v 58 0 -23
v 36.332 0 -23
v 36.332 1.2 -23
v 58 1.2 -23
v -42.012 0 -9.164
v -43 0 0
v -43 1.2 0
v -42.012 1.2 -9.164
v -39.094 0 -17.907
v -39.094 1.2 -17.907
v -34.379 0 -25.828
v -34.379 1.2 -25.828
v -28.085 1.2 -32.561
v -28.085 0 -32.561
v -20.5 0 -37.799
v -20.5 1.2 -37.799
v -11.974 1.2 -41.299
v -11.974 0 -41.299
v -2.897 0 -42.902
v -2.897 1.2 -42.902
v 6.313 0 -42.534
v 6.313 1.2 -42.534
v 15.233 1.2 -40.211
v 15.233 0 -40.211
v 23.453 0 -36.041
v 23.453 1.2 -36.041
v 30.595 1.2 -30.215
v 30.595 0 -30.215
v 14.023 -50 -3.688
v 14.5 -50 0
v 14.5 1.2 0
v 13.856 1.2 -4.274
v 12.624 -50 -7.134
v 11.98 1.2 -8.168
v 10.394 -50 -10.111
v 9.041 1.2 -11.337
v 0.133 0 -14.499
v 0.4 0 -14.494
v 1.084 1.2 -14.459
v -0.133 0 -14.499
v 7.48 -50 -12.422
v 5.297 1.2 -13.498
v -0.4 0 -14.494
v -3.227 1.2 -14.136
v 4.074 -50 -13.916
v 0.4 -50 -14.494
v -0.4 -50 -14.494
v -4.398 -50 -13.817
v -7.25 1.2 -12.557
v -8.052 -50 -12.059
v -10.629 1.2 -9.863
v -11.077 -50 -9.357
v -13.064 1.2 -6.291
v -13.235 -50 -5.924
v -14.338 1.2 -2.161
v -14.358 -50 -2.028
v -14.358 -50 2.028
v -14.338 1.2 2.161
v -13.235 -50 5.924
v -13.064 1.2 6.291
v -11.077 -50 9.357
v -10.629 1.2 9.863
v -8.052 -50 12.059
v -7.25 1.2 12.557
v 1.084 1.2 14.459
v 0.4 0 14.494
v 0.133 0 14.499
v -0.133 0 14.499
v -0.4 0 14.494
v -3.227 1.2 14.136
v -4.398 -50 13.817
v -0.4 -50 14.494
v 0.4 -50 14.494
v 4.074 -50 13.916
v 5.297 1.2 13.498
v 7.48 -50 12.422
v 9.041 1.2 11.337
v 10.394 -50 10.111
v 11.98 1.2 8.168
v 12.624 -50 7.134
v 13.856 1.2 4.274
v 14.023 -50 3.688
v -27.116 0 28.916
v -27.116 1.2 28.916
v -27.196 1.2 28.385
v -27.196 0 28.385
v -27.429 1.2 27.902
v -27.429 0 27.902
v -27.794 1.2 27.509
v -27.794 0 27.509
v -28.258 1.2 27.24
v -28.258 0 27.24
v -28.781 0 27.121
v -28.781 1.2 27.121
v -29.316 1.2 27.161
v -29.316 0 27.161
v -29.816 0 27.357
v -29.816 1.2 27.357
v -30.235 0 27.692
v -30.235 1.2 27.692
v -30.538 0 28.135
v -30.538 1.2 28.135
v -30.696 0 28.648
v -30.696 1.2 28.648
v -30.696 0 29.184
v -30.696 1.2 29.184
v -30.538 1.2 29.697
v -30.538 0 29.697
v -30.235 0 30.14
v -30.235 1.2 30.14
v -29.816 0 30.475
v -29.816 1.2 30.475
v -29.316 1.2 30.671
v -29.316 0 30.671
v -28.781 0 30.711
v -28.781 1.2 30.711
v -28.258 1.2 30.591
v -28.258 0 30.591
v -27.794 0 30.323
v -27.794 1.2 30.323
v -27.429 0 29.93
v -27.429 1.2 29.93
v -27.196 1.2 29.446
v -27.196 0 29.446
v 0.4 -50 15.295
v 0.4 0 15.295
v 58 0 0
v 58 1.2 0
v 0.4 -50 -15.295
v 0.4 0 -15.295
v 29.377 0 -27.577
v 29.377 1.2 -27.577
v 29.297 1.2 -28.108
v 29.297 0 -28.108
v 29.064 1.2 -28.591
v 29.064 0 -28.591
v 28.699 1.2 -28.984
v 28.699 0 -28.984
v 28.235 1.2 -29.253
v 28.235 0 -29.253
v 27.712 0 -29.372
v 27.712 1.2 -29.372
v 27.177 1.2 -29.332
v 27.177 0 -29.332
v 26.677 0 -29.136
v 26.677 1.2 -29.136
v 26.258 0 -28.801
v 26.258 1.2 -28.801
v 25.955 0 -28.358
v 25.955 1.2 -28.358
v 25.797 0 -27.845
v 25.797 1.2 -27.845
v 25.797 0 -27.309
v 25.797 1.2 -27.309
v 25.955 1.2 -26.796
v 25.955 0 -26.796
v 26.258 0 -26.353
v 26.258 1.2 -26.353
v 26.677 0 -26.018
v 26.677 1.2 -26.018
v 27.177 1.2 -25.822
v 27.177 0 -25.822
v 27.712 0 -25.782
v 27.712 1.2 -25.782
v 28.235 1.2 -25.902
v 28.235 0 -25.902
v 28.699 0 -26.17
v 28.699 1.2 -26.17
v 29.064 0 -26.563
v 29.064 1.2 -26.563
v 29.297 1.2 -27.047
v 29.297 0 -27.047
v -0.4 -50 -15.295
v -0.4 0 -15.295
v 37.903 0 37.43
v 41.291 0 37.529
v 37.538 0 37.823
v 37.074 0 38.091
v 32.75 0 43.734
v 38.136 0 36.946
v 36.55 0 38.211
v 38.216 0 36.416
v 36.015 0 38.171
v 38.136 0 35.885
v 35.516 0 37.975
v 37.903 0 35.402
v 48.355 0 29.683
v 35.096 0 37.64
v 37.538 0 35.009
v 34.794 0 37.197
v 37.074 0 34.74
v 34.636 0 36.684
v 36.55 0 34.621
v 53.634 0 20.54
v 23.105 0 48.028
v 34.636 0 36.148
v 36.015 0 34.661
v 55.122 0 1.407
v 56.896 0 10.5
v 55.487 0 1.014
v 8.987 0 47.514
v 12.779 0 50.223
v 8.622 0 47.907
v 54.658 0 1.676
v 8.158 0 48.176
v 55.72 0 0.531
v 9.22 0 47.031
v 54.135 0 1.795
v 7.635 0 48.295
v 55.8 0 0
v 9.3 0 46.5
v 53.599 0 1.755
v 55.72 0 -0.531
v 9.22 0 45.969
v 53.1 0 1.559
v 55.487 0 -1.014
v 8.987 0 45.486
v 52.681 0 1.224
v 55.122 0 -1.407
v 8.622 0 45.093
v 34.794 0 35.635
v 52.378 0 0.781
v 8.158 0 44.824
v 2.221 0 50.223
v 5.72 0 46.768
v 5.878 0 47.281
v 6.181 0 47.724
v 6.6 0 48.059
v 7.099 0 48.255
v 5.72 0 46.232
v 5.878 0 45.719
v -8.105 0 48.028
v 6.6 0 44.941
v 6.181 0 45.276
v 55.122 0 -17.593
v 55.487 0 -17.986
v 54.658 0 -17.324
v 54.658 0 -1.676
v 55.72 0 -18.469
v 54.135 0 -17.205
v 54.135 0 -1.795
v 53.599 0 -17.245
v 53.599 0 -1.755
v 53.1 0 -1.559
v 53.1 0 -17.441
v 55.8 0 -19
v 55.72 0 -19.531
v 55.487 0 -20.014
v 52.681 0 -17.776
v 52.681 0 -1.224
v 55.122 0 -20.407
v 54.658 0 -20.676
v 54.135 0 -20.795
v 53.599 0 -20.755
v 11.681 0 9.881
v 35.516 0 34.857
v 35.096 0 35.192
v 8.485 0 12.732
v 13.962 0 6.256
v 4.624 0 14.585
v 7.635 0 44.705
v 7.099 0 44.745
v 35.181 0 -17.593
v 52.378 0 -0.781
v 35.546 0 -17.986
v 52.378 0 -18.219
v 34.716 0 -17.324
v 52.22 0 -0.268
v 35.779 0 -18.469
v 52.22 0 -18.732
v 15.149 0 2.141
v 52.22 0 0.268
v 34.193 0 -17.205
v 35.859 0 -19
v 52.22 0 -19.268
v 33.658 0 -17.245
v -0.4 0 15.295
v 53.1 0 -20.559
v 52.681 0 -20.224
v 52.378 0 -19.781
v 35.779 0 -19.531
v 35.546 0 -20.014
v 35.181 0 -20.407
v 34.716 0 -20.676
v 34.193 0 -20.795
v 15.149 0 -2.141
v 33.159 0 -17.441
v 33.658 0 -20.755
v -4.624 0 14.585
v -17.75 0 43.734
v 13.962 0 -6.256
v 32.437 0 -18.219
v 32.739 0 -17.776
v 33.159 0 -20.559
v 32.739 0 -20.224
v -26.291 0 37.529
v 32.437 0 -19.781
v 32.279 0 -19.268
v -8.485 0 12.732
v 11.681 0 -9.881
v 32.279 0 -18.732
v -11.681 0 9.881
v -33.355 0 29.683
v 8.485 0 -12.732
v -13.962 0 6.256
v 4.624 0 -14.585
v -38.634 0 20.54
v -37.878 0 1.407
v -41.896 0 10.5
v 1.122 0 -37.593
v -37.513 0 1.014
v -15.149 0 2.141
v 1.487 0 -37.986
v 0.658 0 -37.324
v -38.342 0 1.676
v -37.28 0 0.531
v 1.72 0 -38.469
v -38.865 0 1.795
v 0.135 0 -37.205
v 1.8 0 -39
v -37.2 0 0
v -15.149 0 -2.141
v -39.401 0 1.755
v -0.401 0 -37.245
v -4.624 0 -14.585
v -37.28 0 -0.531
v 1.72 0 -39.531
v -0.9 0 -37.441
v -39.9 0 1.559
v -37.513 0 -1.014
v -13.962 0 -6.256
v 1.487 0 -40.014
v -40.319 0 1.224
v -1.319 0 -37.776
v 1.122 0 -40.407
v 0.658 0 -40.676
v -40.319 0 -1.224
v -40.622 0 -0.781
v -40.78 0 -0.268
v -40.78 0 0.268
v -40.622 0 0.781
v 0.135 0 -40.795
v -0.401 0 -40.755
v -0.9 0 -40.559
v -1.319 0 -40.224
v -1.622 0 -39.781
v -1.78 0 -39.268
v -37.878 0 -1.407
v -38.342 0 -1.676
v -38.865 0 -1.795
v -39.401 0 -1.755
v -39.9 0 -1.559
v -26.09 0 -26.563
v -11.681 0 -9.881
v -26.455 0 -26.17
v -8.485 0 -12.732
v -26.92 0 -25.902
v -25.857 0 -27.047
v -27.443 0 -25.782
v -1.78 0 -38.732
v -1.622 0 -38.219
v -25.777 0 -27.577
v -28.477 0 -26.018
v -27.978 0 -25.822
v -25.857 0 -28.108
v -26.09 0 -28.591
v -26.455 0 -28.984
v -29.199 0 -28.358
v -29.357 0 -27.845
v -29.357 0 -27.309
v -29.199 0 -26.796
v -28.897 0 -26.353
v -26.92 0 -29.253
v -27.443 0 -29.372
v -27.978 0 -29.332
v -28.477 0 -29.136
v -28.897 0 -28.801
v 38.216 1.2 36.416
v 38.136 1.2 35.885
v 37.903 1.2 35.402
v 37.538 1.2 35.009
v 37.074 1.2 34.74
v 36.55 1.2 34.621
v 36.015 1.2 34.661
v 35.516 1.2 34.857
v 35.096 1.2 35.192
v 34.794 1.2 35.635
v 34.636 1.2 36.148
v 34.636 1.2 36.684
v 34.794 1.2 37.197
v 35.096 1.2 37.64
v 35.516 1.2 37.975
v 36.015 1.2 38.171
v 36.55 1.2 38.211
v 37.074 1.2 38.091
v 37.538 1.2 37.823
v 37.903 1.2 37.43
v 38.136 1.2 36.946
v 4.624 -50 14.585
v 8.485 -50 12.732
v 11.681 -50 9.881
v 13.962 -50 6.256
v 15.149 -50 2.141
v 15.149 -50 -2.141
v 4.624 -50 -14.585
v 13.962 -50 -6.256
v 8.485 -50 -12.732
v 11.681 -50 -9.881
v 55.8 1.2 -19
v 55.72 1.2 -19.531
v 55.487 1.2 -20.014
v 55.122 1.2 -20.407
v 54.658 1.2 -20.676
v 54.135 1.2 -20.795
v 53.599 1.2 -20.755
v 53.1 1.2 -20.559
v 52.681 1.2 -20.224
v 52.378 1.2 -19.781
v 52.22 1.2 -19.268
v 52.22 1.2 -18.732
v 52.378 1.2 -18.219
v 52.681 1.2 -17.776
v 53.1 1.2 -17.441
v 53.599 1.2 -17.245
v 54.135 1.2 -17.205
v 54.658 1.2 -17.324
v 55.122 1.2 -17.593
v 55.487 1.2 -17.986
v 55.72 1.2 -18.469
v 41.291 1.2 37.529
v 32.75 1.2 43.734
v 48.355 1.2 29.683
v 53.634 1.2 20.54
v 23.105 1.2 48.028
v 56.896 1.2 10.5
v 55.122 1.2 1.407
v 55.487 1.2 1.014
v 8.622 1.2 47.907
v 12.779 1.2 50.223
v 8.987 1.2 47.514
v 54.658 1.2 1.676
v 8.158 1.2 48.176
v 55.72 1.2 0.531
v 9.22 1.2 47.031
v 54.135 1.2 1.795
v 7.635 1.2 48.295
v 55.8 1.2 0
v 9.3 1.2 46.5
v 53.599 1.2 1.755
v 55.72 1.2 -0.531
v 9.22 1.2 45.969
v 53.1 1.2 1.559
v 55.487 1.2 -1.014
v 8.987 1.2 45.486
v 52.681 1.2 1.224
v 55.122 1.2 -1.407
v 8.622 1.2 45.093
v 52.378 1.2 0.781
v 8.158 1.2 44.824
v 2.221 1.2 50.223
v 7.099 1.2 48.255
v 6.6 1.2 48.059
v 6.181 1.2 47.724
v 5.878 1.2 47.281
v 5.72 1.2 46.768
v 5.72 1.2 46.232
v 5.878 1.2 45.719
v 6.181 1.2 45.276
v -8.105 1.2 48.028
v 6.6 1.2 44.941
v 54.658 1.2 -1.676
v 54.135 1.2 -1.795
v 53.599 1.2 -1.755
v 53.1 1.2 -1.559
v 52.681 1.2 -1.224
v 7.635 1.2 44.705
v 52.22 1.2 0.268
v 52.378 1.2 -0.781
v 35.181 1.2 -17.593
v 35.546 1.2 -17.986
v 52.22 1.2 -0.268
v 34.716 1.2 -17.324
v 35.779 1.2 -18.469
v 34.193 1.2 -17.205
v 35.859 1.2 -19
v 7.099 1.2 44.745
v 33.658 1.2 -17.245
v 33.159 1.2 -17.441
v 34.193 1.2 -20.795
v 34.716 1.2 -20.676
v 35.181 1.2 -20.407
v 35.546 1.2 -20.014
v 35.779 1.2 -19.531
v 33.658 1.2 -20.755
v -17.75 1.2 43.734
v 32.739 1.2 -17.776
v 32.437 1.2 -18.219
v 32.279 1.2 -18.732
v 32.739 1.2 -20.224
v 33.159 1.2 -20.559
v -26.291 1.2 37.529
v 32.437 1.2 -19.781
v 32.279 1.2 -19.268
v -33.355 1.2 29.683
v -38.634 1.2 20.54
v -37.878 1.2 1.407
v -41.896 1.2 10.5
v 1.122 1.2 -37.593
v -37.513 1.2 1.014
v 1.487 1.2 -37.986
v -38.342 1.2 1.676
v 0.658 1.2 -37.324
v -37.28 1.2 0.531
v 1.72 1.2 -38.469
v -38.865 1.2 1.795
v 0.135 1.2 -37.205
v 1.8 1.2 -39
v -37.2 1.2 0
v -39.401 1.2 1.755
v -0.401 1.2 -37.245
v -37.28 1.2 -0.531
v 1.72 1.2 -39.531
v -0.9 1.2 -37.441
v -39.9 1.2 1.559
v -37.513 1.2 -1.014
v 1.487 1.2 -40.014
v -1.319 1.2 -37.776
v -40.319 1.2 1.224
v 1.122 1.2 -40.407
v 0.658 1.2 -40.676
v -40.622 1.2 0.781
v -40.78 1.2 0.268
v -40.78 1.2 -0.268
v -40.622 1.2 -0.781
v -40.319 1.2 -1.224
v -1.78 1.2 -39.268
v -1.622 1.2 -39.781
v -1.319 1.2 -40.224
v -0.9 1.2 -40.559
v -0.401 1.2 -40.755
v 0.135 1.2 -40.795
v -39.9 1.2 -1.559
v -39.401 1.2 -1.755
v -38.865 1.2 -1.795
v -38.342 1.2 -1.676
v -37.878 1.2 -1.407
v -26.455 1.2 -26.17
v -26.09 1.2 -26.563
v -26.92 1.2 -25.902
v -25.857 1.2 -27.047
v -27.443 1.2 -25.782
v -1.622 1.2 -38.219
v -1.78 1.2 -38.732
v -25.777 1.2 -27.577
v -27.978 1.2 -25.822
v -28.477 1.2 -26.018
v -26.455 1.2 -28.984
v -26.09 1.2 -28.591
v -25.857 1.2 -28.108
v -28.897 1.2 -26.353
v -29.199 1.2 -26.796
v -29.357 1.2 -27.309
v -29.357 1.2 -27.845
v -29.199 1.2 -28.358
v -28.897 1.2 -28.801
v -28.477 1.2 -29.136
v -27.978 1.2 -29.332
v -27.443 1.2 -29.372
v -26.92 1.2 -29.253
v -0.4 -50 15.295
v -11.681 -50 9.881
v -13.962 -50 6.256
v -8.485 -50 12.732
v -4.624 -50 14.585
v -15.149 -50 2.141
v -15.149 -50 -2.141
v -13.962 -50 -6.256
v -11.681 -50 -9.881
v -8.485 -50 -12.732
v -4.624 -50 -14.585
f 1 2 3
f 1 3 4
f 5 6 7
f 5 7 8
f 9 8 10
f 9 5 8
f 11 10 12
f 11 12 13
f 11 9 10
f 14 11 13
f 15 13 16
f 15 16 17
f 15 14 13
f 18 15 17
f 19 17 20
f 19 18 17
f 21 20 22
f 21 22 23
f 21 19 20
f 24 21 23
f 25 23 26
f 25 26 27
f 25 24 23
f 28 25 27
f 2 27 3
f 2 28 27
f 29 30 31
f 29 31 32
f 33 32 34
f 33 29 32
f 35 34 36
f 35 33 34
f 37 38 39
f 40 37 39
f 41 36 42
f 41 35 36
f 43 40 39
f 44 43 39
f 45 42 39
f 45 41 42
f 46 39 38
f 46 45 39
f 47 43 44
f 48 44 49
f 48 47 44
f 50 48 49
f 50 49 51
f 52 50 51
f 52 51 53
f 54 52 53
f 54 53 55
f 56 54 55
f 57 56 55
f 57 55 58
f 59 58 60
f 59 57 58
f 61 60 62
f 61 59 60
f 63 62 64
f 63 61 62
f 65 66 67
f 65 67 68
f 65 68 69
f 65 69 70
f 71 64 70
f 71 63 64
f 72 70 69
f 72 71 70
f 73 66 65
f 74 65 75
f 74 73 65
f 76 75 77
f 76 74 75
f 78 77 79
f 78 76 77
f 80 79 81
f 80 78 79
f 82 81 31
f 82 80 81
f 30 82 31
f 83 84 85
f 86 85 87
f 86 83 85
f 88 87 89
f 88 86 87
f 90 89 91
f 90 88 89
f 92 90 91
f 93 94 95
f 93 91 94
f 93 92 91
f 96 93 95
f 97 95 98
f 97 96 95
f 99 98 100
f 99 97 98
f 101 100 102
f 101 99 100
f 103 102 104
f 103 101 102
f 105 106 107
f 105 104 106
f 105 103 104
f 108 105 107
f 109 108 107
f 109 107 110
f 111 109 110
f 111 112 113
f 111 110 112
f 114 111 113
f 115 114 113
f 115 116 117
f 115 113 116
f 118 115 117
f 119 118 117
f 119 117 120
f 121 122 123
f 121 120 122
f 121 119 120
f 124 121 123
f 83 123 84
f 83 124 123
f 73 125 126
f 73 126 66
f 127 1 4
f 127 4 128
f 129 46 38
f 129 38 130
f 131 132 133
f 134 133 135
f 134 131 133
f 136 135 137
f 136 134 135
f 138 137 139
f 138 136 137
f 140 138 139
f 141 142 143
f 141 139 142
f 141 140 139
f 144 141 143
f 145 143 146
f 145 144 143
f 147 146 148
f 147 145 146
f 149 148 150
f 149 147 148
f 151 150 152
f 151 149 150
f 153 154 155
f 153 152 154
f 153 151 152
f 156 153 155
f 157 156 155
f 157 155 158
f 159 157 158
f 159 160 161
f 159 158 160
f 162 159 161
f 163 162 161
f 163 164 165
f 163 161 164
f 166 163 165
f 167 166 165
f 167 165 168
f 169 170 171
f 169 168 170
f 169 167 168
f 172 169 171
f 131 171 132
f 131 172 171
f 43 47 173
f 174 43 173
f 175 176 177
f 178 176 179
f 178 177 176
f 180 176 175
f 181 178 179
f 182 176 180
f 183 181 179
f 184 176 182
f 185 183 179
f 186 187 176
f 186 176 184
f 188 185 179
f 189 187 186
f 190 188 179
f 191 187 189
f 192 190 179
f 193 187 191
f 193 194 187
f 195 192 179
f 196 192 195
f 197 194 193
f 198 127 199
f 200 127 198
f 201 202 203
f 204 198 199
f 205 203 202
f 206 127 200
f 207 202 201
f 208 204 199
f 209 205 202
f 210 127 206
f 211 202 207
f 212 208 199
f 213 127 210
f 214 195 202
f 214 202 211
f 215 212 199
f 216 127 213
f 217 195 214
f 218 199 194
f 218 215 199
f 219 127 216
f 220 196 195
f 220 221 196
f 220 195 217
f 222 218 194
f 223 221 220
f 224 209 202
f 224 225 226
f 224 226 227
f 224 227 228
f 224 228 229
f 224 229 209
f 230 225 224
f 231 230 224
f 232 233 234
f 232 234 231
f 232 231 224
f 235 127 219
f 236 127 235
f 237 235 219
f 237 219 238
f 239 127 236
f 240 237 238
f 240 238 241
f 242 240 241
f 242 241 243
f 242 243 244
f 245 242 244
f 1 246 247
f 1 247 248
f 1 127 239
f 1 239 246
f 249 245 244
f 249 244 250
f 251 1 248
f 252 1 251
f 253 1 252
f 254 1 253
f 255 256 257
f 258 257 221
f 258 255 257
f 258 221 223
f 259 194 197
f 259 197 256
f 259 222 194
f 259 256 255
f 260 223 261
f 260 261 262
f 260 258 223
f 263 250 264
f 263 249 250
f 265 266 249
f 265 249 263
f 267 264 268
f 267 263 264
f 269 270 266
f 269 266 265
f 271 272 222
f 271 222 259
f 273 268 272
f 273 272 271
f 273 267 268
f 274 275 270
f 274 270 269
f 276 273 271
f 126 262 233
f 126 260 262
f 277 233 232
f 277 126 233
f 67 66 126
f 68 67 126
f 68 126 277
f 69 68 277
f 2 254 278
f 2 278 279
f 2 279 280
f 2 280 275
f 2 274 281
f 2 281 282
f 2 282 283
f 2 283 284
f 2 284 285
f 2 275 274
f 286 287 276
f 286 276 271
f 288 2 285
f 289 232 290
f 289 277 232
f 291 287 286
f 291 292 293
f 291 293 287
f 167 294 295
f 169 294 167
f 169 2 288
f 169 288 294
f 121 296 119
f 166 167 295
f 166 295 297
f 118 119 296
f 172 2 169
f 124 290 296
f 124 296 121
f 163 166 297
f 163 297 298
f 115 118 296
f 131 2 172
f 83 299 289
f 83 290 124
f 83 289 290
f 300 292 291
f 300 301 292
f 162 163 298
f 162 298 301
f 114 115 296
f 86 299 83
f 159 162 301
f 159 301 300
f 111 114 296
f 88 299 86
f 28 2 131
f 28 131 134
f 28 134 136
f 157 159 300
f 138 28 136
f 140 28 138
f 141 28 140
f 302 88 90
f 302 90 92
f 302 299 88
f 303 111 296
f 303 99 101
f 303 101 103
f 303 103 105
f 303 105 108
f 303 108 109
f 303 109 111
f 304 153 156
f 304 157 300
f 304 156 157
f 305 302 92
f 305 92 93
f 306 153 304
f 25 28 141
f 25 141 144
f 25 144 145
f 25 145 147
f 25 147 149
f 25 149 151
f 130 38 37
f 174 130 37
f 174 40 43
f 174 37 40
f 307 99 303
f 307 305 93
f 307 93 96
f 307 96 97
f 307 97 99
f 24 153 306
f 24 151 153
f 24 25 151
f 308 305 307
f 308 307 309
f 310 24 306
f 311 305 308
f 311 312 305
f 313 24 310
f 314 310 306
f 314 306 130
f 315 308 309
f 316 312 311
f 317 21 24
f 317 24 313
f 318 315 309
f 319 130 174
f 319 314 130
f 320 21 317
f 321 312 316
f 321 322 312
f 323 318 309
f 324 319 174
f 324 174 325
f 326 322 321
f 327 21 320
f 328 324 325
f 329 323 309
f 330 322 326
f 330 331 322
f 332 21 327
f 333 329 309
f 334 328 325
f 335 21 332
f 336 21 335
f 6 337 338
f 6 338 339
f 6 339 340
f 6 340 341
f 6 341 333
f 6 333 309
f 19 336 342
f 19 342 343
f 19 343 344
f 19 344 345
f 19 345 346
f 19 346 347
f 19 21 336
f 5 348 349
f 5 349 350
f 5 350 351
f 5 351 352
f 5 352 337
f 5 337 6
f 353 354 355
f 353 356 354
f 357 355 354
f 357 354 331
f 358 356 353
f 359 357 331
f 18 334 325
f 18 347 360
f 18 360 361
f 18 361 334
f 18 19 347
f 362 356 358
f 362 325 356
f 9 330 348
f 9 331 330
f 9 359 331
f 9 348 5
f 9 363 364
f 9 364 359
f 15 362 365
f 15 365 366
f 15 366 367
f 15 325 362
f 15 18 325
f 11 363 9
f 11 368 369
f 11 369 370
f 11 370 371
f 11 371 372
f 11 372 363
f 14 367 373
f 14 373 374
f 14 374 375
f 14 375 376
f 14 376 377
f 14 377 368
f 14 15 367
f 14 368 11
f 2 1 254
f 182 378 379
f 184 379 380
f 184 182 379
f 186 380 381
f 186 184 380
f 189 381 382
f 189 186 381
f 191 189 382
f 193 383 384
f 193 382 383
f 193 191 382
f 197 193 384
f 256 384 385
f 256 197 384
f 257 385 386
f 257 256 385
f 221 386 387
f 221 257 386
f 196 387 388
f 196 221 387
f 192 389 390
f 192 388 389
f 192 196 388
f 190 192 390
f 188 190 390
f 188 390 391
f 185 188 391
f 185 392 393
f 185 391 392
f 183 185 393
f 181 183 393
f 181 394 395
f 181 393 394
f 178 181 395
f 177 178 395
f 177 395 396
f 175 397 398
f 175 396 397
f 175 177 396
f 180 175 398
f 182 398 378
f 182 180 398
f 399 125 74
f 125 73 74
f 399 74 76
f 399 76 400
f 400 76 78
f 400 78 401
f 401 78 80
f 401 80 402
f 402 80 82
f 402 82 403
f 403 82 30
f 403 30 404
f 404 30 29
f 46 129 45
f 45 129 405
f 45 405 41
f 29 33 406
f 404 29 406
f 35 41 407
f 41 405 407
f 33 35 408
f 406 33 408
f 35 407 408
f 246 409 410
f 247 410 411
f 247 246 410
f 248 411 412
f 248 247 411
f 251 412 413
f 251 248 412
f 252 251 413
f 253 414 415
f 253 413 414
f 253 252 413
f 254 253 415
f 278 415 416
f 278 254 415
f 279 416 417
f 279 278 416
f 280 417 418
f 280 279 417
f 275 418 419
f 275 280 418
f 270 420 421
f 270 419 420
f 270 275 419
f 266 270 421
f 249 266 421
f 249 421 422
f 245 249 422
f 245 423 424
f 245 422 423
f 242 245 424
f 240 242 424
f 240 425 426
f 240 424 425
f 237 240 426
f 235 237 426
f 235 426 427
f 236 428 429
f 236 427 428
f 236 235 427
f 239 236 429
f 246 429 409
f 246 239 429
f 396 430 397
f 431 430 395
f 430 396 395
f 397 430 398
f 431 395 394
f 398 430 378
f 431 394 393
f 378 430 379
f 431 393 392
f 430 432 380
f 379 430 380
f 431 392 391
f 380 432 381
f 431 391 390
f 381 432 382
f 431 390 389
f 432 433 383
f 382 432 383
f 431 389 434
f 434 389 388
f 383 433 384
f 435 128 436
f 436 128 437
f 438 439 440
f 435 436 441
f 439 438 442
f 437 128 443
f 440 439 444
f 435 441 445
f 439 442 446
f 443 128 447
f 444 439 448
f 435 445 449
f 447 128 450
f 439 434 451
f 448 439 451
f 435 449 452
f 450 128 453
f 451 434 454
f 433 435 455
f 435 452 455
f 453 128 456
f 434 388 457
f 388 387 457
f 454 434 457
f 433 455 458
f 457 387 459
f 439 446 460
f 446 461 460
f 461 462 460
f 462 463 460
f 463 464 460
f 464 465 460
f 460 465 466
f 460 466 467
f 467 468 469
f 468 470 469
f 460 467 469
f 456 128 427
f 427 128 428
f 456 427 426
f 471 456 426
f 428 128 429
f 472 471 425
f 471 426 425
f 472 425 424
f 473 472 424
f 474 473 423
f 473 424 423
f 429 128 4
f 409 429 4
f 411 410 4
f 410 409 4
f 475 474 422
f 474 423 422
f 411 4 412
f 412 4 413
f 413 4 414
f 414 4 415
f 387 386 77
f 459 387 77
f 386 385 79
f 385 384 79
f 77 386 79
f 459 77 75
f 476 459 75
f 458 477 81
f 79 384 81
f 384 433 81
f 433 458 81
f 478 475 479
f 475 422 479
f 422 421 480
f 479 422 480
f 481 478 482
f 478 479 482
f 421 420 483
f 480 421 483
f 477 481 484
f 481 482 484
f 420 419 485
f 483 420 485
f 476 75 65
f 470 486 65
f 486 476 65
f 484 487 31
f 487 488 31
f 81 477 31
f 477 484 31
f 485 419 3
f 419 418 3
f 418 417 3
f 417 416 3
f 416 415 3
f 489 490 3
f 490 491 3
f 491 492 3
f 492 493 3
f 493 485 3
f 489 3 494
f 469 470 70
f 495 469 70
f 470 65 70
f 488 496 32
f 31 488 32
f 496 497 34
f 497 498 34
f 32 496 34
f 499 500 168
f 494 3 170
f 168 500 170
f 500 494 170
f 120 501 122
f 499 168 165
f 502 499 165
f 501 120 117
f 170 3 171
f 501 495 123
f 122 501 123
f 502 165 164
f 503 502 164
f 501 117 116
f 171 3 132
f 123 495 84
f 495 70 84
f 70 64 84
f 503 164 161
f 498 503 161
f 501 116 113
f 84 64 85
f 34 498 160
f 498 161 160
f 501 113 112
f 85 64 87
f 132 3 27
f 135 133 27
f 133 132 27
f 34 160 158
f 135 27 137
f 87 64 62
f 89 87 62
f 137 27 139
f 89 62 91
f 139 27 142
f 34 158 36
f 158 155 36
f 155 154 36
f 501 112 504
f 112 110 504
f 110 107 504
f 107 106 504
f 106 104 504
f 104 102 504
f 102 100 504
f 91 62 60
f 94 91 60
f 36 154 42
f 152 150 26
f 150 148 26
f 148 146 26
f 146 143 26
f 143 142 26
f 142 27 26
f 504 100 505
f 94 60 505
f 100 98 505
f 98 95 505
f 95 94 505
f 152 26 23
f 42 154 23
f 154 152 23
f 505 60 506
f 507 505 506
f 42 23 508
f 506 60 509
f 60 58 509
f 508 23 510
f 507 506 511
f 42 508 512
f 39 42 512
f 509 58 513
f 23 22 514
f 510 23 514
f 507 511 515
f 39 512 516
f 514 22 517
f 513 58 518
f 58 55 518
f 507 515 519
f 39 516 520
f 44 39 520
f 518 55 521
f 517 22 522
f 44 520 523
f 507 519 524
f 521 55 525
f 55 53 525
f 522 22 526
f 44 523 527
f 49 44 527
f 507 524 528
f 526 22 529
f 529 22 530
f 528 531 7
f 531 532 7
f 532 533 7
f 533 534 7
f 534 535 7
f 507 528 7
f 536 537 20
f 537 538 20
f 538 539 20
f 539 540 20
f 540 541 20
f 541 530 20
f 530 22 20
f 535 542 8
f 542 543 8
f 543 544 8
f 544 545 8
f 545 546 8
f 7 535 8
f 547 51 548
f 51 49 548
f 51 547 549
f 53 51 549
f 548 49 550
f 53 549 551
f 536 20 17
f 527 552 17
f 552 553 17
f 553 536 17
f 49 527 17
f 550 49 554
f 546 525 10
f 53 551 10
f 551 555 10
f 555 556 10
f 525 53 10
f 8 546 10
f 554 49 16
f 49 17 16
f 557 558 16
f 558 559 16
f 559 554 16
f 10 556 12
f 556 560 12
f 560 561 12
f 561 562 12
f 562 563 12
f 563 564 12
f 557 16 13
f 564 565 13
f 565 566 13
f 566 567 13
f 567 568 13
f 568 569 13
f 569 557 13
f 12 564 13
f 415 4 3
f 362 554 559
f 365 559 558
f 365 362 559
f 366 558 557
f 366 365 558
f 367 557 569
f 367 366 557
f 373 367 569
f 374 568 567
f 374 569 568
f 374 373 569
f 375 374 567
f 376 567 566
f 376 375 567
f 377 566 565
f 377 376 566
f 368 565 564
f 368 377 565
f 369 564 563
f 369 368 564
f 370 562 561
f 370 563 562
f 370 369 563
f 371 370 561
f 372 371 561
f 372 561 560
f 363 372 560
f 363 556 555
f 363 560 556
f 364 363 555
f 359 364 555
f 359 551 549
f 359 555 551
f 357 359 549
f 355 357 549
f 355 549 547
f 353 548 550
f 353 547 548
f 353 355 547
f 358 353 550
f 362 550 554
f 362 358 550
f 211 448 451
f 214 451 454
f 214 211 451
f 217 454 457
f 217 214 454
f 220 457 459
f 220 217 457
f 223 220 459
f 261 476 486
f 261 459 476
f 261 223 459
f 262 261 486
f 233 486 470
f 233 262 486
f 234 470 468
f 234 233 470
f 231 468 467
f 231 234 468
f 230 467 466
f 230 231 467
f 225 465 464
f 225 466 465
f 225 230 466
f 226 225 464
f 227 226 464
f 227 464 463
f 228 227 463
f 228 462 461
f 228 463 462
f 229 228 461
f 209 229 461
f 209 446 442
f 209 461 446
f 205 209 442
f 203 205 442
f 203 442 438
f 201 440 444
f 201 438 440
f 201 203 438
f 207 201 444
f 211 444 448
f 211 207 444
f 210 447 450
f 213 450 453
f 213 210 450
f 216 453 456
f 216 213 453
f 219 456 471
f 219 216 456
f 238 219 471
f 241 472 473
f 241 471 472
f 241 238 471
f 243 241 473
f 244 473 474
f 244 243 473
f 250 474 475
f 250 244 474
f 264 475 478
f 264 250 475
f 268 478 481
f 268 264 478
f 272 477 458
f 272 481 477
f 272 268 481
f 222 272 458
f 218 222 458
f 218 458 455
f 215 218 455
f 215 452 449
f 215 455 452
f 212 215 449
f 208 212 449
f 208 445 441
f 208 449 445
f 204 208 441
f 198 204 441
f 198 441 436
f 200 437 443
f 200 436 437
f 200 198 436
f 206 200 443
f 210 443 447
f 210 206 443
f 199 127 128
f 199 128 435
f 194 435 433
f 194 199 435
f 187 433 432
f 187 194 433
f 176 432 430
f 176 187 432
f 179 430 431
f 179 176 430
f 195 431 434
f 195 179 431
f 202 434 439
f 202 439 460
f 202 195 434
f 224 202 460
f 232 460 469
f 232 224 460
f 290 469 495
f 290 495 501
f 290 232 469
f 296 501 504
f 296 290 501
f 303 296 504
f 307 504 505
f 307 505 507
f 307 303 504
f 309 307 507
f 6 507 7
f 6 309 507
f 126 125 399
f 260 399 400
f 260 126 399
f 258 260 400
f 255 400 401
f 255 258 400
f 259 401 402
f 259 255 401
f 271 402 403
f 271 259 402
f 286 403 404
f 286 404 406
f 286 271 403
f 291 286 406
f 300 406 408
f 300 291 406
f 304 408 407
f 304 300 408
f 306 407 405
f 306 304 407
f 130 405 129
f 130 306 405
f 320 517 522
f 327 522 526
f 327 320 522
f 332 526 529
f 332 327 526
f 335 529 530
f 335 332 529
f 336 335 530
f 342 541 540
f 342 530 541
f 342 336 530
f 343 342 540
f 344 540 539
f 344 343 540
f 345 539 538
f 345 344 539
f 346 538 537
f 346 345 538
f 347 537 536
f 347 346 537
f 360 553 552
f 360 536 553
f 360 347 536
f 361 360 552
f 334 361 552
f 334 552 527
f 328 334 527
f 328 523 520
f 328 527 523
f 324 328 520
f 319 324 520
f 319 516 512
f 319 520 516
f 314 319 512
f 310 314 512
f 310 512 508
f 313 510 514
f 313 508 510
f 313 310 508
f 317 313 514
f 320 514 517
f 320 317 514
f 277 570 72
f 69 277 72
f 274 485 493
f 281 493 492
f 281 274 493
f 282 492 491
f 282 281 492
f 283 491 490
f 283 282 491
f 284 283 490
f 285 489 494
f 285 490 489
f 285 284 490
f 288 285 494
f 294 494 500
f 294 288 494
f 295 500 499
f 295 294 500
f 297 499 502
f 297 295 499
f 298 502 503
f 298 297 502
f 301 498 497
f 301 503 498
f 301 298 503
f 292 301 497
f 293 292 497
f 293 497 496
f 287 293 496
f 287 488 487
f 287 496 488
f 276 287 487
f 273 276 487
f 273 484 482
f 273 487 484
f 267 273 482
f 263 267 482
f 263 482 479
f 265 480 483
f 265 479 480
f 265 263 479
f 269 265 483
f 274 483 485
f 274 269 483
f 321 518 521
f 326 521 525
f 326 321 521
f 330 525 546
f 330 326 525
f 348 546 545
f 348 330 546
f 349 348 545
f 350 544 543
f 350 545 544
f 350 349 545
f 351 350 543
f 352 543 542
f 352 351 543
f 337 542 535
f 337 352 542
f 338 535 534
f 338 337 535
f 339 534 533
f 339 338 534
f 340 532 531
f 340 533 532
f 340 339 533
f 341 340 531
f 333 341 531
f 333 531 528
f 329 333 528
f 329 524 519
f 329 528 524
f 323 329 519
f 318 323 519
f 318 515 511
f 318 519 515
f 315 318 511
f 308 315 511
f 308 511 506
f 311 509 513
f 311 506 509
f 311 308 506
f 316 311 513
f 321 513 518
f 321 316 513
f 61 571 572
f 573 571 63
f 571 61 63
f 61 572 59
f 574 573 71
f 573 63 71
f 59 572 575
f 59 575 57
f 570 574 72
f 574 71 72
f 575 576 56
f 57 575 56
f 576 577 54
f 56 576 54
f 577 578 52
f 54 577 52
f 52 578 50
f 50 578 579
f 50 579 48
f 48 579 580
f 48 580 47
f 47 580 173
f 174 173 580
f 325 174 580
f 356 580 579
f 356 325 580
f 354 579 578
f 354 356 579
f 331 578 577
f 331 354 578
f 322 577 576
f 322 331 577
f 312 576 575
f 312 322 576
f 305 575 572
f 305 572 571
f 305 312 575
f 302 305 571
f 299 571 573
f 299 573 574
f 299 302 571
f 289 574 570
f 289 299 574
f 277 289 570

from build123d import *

# Parameters (mm, degrees)
EXTRUDE_1_DEPTH     = 1.2
SKETCH_2_R          = 15.3
SKETCH_2_R_2        = 14.5
EXTRUDE_1_2_DEPTH   = 50
EXTRUDE_2_DEPTH     = 1.2
SKETCH_8_R          = 1.8
CUT_EXTRUDE_4_DEPTH = 2.2
SKETCH_2_2_R        = 14.5
CUT_EXTRUDE_1_DEPTH = 2.2
CUT_EXTRUDE_START   = -50
SKETCH_3_W          = 0.8
SKETCH_3_H          = 35
CUT_EXTRUDE_2_DEPTH = 50


with BuildPart() as part:
    # Sketch 1 → Extrude 1 (new body)
    with BuildSketch(Plane(origin=(0, 0, 0), x_dir=(1, 0, 0), z_dir=(0, 1, 0))):
        with BuildLine():
            Line((35, 0), (35, 15))
            Line((35, 15), (50, 15))
            Line((50, 15), (50, 0))
            ThreePointArc((50, 0), (7.5, -42.5), (-35, 0))
            ThreePointArc((-35, 0), (0, 35), (35, 0))
        make_face()
    extrude(amount=EXTRUDE_1_DEPTH)

    # Sketch 2 → Extrude 1 2 (add)
    with BuildSketch(Plane(origin=(0, 0, 0), x_dir=(1, 0, 0), z_dir=(0, 1, 0))):
        Circle(SKETCH_2_R)
        Circle(SKETCH_2_R_2, mode=Mode.SUBTRACT)
    extrude(amount=-EXTRUDE_1_2_DEPTH)

    # Sketch 7 → Extrude 2 (add)
    with BuildSketch(Plane(origin=(0, 0, 0), x_dir=(1, 0, 0), z_dir=(0, 1, 0))):
        with BuildLine():
            Line((36.331804249, 23), (58, 23))
            Line((58, 23), (58, 0))
            ThreePointArc((58, 0), (7.5, -50.5), (-43, 0))
            ThreePointArc((-43, 0), (-11.973562905, 41.299319502), (36.331804249, 23))
        make_face()
        with BuildLine():
            Line((35, 0), (35, 15))
            Line((35, 15), (50, 15))
            Line((50, 15), (50, 0))
            ThreePointArc((50, 0), (7.5, -42.5), (-35, 0))
            ThreePointArc((-35, 0), (0, 35), (35, 0))
        make_face(mode=Mode.SUBTRACT)
    extrude(amount=EXTRUDE_2_DEPTH)

    # Sketch 8 → Cut-Extrude 4 (cut, through all)
    with BuildSketch(Plane(origin=(0, 0, 0), x_dir=(1, 0, 0), z_dir=(0, 1, 0))):
        with Locations((34.058772732, 19)):
            Circle(SKETCH_8_R)
        with Locations((54, 19)):
            Circle(SKETCH_8_R)
        with Locations((54, 0)):
            Circle(SKETCH_8_R)
        with Locations((7.5, -46.5)):
            Circle(SKETCH_8_R)
        with Locations((-39, 0)):
            Circle(SKETCH_8_R)
        with Locations((0, 39)):
            Circle(SKETCH_8_R)
        with Locations((36.415922611, -36.415922611)):
            Circle(SKETCH_8_R)
        with Locations((-28.915922611, -28.915922611)):
            Circle(SKETCH_8_R)
        with Locations((-27.577164466, 27.577164466)):
            Circle(SKETCH_8_R)
        with Locations((27.577164466, 27.577164466)):
            Circle(SKETCH_8_R)
    extrude(amount=CUT_EXTRUDE_4_DEPTH, mode=Mode.SUBTRACT)

    # Sketch 2_2 → Cut-Extrude 1 (cut, through all)
    with BuildSketch(Plane(origin=(0, 0, 0), x_dir=(1, 0, 0), z_dir=(0, 1, 0))):
        Circle(SKETCH_2_2_R)
    extrude(amount=CUT_EXTRUDE_1_DEPTH, mode=Mode.SUBTRACT)

    # Sketch 3 → Cut-Extrude 2 (cut)
    with BuildSketch(Plane(origin=(0, 0, 0), x_dir=(1, 0, 0), z_dir=(0, 1, 0)).offset(CUT_EXTRUDE_START)):
        Rectangle(SKETCH_3_W, SKETCH_3_H)
    extrude(amount=CUT_EXTRUDE_2_DEPTH, mode=Mode.SUBTRACT)


solid = part.part
